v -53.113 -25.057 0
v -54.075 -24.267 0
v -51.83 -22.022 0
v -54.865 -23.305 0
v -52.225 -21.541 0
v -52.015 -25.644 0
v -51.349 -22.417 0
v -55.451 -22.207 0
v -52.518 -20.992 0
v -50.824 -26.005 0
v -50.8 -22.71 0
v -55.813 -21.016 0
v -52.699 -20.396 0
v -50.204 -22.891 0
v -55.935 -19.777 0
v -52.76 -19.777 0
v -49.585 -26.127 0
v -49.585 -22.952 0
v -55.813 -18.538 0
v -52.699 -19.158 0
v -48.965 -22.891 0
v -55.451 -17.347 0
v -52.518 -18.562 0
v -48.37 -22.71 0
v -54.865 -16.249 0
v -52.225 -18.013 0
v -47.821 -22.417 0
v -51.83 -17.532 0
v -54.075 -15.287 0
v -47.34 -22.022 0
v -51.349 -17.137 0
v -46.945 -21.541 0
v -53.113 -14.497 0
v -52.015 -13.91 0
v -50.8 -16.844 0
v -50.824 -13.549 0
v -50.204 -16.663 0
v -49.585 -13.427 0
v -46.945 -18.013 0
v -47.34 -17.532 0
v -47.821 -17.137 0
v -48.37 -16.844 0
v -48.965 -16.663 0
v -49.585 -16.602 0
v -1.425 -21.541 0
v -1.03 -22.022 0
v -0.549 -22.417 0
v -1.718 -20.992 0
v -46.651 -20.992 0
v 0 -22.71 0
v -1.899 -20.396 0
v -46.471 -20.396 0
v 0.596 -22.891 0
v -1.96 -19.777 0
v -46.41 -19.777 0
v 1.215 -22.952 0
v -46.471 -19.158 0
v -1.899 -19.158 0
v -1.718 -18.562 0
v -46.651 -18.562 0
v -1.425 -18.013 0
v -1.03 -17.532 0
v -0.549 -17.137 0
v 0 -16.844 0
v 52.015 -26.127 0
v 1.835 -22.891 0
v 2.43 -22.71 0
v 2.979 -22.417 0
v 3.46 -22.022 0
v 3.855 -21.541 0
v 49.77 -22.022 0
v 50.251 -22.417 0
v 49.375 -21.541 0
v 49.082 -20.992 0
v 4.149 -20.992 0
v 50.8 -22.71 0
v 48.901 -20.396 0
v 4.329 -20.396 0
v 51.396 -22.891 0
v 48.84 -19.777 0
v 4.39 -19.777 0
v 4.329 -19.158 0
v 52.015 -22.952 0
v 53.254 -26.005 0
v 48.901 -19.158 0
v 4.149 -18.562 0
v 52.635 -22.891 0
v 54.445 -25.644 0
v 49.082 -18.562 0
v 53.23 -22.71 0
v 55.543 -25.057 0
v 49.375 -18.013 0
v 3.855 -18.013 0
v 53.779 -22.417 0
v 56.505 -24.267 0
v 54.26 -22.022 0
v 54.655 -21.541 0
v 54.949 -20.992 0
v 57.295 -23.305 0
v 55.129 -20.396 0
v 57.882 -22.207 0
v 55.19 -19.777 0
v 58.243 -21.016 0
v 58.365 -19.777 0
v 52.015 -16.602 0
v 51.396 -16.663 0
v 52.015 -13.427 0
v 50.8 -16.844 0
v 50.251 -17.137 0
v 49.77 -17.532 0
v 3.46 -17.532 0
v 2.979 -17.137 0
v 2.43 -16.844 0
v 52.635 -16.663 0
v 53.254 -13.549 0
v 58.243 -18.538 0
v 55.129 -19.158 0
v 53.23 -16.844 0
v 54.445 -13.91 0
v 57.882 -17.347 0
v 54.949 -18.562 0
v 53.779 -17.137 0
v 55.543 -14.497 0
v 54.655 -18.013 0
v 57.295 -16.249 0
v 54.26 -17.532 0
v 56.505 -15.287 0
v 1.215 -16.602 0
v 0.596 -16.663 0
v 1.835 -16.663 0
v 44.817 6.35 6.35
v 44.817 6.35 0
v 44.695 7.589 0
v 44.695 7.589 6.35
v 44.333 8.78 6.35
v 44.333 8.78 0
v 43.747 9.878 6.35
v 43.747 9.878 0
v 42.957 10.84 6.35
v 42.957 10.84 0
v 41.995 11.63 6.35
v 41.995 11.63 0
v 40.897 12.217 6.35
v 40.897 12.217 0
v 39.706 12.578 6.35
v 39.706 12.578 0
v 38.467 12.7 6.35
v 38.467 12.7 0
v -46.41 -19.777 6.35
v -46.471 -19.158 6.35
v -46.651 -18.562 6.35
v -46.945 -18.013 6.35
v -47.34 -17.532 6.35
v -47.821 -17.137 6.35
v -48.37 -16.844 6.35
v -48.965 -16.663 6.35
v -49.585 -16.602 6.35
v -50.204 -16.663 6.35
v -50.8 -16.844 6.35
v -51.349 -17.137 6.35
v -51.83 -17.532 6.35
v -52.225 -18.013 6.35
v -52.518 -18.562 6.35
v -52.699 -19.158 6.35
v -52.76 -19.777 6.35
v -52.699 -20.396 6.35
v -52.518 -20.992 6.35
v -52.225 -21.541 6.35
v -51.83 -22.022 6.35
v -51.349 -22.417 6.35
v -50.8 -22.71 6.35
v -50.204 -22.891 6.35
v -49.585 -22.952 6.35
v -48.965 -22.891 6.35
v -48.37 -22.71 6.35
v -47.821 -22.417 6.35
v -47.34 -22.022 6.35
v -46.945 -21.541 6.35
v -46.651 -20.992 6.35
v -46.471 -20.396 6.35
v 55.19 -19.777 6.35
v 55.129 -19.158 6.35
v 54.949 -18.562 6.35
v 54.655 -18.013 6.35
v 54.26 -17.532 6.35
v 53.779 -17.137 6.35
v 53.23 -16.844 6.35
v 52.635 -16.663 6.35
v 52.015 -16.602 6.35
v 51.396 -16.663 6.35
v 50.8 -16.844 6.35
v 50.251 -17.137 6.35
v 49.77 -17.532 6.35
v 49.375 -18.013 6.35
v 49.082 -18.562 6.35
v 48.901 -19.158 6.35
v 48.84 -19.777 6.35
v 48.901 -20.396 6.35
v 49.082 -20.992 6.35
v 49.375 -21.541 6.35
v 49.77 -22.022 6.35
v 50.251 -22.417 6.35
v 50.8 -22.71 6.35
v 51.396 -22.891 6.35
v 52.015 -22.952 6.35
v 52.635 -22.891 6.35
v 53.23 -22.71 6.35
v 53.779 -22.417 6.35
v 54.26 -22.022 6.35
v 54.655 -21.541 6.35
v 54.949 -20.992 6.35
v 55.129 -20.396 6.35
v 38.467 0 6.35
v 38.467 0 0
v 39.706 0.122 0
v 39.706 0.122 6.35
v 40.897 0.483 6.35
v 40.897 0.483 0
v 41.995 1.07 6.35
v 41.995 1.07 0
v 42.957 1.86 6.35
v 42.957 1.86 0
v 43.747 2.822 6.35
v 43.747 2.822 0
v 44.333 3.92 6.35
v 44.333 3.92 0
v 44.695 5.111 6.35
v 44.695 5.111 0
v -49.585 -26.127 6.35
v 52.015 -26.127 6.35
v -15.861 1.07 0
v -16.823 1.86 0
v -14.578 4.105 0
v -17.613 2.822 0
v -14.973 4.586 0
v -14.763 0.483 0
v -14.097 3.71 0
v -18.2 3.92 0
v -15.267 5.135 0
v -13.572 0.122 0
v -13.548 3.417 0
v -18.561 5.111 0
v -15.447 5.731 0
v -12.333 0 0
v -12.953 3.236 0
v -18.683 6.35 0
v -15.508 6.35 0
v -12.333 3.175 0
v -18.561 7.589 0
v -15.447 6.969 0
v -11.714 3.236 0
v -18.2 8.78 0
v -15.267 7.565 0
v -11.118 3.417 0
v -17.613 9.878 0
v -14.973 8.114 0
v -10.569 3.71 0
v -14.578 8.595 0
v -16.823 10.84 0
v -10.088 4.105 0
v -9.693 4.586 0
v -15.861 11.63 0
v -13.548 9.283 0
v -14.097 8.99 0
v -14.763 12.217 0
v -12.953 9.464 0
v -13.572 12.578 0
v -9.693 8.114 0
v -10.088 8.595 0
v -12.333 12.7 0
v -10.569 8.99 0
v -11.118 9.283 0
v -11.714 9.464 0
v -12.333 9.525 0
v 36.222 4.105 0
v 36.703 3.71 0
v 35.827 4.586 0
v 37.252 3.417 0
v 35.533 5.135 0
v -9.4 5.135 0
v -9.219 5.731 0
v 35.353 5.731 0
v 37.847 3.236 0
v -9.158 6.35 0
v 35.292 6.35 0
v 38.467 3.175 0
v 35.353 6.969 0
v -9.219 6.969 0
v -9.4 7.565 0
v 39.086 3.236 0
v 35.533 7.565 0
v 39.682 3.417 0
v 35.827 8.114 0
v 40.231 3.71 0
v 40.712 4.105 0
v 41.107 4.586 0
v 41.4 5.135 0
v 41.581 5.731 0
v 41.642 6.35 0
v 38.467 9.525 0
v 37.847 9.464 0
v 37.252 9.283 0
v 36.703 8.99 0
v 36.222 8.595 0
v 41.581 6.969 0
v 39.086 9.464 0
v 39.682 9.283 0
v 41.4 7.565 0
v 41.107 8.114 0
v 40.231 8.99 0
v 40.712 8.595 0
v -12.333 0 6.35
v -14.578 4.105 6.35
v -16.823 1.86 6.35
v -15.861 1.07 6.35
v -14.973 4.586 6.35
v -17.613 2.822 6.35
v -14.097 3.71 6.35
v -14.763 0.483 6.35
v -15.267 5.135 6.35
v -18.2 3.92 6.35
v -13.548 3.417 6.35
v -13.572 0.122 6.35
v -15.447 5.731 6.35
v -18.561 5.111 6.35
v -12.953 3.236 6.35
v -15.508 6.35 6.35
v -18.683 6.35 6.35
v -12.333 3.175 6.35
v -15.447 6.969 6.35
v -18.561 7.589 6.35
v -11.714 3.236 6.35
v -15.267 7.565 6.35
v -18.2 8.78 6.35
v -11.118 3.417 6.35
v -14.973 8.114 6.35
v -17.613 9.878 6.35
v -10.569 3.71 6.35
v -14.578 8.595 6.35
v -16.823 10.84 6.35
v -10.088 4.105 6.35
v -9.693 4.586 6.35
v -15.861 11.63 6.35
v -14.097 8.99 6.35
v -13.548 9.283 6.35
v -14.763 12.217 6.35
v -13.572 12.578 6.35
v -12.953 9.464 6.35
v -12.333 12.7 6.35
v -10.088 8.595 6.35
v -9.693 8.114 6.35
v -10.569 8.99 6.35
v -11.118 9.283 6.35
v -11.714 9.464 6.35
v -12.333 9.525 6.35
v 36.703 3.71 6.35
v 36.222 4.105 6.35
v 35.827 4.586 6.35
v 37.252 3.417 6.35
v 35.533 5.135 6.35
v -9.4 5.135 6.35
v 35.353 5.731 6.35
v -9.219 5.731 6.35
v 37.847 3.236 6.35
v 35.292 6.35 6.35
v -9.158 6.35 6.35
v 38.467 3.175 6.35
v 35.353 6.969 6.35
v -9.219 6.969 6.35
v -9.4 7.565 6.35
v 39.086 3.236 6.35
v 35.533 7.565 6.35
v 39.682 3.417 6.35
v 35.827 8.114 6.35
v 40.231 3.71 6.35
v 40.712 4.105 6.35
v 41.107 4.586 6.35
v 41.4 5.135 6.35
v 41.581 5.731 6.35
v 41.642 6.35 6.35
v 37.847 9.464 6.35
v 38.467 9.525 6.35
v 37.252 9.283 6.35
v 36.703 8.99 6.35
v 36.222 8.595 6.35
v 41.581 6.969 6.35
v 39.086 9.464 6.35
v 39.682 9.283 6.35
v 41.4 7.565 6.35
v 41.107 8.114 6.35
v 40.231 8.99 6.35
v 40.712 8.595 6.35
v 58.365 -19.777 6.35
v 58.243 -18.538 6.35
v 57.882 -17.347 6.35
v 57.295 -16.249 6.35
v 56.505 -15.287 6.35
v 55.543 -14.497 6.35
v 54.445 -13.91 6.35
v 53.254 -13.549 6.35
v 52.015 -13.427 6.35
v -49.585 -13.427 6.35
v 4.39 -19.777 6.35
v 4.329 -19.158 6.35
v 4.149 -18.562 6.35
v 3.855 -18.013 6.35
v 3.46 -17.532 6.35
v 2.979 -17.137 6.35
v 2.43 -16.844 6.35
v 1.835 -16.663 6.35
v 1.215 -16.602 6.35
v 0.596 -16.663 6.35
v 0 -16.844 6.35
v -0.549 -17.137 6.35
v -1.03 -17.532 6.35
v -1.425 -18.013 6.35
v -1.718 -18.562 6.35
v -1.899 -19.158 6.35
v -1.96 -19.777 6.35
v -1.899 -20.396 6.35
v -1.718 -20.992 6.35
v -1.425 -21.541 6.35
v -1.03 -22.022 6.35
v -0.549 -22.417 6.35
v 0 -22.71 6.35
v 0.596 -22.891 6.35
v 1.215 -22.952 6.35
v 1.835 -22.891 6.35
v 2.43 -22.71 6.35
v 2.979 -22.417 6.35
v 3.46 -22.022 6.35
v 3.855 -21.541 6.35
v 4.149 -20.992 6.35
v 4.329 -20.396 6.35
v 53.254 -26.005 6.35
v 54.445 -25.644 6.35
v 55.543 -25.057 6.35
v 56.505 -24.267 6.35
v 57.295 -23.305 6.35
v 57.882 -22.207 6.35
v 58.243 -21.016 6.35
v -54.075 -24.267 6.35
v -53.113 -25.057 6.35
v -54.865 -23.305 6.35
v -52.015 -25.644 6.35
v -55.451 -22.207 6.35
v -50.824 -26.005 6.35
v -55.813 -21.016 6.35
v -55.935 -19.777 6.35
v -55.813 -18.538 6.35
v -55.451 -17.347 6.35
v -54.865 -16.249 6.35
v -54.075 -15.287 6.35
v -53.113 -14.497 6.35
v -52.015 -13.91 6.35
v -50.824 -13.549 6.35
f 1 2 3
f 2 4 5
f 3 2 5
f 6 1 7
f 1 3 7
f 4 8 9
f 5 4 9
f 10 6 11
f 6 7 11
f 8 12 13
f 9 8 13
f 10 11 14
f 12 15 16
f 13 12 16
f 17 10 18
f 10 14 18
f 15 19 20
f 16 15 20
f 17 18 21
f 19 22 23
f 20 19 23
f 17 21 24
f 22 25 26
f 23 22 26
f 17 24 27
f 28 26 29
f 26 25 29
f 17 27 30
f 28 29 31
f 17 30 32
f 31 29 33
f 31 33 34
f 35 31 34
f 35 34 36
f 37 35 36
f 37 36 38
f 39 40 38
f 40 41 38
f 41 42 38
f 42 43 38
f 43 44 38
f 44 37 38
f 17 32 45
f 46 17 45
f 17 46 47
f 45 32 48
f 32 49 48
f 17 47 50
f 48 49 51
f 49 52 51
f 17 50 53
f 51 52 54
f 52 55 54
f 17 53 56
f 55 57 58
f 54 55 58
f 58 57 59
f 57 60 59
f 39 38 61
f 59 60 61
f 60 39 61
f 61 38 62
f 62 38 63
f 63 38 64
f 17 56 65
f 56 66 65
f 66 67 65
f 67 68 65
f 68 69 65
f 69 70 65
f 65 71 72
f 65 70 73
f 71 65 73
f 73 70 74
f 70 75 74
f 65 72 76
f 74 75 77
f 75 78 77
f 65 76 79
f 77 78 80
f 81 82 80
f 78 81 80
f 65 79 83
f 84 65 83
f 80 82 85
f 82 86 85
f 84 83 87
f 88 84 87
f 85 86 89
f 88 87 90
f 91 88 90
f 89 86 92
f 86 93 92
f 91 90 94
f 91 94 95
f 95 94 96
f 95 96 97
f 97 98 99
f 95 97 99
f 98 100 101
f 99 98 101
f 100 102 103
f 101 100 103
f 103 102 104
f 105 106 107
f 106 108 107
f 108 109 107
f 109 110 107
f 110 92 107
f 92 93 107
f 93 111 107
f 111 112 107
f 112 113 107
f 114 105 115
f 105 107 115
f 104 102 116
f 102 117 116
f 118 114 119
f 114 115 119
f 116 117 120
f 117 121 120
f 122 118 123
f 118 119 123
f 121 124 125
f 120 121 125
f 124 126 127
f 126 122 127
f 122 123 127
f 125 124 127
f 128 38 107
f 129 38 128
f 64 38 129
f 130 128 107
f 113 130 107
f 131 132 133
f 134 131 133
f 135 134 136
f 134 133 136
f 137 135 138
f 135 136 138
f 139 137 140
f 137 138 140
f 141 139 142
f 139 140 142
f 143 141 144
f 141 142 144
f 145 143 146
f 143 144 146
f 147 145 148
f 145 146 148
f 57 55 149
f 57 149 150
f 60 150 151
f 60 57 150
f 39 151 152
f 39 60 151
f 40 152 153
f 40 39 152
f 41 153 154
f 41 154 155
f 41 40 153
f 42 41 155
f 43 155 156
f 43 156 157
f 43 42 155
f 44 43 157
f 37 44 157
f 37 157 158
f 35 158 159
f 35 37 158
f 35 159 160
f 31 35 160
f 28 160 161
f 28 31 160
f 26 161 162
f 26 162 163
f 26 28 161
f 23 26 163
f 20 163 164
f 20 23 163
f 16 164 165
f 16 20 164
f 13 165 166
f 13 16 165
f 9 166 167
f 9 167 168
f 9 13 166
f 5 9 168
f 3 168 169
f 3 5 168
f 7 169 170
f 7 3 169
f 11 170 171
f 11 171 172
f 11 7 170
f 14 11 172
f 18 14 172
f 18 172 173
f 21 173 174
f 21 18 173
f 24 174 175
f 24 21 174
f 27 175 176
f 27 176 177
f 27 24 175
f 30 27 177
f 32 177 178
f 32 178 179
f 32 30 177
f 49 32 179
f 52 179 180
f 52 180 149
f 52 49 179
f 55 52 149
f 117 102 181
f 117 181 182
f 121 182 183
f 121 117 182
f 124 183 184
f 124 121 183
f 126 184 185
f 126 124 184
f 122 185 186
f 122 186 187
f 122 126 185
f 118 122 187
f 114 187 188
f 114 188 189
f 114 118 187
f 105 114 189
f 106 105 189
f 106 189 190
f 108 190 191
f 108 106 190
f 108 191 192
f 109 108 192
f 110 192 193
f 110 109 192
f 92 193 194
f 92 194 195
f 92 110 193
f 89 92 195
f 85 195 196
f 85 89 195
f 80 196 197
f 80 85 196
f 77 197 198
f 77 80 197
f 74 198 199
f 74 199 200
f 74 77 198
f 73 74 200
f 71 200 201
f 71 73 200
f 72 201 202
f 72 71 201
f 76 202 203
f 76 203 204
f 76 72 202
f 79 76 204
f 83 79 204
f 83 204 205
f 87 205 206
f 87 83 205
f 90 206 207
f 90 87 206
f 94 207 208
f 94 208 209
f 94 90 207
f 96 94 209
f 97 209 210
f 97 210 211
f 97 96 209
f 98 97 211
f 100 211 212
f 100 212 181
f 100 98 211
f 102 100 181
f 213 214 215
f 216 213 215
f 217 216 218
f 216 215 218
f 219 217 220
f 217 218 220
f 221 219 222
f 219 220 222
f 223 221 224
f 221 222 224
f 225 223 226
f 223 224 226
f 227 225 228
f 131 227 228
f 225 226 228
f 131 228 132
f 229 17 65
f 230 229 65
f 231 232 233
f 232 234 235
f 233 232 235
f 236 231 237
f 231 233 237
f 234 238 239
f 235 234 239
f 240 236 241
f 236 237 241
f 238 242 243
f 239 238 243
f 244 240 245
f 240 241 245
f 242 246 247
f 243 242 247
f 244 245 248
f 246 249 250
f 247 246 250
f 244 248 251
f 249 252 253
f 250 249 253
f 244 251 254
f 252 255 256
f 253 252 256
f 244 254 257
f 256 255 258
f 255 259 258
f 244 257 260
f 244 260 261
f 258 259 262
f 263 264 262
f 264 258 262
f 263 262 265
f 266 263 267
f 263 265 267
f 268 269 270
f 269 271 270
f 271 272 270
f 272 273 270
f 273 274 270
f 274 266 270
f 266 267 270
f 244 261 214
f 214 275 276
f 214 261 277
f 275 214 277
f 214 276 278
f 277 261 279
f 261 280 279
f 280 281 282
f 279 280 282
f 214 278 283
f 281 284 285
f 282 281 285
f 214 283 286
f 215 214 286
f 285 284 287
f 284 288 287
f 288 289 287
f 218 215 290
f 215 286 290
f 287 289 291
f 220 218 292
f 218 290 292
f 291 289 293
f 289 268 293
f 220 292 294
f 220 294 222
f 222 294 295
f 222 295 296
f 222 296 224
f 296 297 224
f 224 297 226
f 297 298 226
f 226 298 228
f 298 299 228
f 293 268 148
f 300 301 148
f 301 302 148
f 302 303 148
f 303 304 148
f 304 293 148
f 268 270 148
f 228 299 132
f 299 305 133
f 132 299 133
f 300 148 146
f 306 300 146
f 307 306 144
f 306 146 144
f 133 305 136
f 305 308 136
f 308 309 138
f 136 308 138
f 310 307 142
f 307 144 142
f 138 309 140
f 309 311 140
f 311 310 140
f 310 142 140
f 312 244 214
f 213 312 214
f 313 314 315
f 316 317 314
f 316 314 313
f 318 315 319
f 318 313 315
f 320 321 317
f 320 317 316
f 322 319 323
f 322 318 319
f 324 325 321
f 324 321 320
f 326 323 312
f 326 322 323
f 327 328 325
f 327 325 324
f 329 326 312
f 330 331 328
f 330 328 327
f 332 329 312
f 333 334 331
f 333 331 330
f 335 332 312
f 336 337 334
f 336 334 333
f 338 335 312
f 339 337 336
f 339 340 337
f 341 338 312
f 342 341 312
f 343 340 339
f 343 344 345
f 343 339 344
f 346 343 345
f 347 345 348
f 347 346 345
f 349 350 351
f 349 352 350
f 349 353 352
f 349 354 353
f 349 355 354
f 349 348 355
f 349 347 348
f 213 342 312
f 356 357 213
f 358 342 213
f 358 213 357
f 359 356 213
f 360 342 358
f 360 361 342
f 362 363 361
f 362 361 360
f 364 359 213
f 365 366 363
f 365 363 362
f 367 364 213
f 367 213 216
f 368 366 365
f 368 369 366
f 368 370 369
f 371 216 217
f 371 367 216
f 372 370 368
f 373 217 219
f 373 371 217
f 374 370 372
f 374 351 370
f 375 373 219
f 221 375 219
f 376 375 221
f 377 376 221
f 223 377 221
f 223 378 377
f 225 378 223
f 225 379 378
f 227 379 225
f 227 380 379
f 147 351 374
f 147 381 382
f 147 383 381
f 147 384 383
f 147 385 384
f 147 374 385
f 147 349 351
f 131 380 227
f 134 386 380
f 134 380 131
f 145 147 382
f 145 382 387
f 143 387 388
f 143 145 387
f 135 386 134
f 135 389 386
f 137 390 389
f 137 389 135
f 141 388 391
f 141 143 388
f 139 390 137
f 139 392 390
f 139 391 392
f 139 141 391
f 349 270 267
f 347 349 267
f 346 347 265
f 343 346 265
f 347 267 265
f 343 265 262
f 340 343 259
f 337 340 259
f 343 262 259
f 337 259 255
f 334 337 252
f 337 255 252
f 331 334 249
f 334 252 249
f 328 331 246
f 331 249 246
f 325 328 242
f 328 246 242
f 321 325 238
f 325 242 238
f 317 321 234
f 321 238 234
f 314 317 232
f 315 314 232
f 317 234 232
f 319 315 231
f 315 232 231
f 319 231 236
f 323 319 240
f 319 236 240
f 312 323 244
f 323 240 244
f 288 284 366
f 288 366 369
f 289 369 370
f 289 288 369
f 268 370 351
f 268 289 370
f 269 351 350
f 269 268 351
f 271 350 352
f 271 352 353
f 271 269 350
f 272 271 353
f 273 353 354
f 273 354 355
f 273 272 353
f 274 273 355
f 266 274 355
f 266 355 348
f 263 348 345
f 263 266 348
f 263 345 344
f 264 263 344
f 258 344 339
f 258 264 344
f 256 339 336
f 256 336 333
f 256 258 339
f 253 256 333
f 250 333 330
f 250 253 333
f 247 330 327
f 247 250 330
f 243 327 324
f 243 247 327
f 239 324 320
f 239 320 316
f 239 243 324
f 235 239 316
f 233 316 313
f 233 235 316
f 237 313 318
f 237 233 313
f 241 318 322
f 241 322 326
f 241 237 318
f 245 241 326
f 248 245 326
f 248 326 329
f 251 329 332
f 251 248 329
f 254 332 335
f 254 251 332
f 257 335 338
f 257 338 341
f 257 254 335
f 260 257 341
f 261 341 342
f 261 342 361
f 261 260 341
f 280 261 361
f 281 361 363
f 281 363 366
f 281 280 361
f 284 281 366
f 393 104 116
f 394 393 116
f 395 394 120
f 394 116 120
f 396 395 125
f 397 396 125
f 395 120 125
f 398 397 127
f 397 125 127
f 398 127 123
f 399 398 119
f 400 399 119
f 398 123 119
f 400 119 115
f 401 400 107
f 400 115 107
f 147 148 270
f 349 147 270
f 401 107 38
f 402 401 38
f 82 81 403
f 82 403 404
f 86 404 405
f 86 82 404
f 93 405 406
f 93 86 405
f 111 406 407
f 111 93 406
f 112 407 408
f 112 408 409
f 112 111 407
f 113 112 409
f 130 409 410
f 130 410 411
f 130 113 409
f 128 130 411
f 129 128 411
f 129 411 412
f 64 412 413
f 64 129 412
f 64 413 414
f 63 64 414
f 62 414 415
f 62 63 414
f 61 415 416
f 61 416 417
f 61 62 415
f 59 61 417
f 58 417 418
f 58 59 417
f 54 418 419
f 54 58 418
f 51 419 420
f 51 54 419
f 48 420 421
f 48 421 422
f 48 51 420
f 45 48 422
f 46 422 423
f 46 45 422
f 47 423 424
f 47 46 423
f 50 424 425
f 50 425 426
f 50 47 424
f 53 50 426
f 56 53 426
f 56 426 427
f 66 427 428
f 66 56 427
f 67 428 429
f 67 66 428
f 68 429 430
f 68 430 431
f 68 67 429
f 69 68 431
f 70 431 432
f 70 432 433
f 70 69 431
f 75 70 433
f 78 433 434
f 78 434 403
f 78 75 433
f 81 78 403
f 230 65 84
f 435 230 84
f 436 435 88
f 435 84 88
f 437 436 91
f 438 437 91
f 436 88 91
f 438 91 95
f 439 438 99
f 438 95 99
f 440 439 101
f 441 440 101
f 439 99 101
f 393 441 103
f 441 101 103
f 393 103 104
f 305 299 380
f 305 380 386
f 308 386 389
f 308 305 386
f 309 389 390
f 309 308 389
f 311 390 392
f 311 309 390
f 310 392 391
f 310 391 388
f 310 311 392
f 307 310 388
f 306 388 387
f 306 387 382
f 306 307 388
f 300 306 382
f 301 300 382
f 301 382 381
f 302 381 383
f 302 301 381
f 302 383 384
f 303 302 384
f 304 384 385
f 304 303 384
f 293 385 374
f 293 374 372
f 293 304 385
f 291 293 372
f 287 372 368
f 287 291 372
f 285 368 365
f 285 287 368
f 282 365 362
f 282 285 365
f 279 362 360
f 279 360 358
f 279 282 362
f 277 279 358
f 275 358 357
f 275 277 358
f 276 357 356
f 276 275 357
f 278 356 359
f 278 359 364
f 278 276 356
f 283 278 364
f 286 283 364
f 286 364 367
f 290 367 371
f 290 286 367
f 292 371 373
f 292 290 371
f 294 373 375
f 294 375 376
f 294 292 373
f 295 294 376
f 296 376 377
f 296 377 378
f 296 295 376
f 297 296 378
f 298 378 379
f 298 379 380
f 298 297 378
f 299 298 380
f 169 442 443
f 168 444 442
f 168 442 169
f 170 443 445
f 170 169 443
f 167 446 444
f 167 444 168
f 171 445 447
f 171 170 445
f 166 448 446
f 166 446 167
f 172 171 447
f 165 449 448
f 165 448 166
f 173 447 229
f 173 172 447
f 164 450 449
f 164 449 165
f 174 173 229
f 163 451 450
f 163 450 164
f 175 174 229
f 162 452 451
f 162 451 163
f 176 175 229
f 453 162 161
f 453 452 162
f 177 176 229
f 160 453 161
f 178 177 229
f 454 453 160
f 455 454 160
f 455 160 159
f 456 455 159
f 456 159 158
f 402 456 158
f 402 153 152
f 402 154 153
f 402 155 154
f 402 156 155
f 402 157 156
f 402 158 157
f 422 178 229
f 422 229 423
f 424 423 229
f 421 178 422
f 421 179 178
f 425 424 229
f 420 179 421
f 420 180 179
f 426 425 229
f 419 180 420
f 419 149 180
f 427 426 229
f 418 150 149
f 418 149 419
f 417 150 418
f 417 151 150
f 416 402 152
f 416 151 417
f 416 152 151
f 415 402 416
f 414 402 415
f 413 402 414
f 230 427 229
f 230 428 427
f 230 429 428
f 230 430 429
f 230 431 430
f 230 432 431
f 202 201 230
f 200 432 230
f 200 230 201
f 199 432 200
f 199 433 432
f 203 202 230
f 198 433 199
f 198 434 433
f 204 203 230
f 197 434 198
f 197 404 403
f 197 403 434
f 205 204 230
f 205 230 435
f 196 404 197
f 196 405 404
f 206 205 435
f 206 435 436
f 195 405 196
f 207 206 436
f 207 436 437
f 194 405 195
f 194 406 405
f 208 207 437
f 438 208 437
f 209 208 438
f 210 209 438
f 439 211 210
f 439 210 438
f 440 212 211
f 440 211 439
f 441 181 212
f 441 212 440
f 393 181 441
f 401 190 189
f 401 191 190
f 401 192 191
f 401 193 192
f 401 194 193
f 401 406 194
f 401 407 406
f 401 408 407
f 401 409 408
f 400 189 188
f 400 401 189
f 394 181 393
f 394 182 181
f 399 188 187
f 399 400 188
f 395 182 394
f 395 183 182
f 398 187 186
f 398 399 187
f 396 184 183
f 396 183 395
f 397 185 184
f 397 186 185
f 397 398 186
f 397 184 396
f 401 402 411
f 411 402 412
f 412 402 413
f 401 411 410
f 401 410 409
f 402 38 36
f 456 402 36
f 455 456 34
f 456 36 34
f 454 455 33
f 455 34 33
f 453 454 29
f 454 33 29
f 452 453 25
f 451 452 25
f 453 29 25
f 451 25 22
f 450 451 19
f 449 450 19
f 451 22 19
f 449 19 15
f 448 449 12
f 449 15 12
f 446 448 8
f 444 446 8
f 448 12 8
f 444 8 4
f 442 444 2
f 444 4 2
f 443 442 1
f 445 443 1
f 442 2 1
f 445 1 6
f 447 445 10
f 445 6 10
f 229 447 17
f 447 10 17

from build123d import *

# Parameters (mm, degrees)
F0_R     = 3.175
F1_DEPTH = 6.35


with BuildPart() as f1:
    # F0 (on Top) → F1 (new body)
    with BuildSketch(Plane.XY):
        with BuildLine():
            ThreePointArc((-12.333258, 0), (-7.84313, 1.859872), (-5.983258, 6.35))
            ThreePointArc((-5.983258, 6.35), (-7.84313, 10.840128), (-12.333258, 12.7))
            ThreePointArc((-12.333258, 12.7), (-18.683258, 6.35), (-12.333258, 0))
        make_face()
        with Locations((-12.333258, 6.35)):
            Circle(F0_R, mode=Mode.SUBTRACT)
        with BuildLine():
            ThreePointArc((-12.333258, 12.7), (-7.84313, 10.840128), (-5.983258, 6.35))
            ThreePointArc((-5.983258, 6.35), (-7.84313, 1.859872), (-12.333258, 0))
            Line((-12.333258, 0), (38.466742, 0))
            ThreePointArc((38.466742, 0), (32.116742, 6.35), (38.466742, 12.7))
            Line((38.466742, 12.7), (-12.333258, 12.7))
        make_face()
        with BuildLine():
            ThreePointArc((44.816742, 6.35), (42.95687, 10.840128), (38.466742, 12.7))
            ThreePointArc((38.466742, 12.7), (32.116742, 6.35), (38.466742, 0))
            ThreePointArc((38.466742, 0), (42.95687, 1.859872), (44.816742, 6.35))
        make_face()
        with Locations((38.466742, 6.35)):
            Circle(F0_R, mode=Mode.SUBTRACT)
        with BuildLine():
            ThreePointArc((-49.584795, -13.427065), (-45.094667, -15.286937), (-43.234795, -19.777065))
            ThreePointArc((-43.234795, -19.777065), (-45.094667, -24.267193), (-49.584795, -26.127065))
            Line((-49.584795, -26.127065), (1.215205, -26.127065))
            ThreePointArc((1.215205, -26.127065), (-5.134795, -19.777065), (1.215205, -13.427065))
            Line((1.215205, -13.427065), (-49.584795, -13.427065))
        make_face()
        with BuildLine():
            Line((52.015205, -13.427065), (1.215205, -13.427065))
            ThreePointArc((1.215205, -13.427065), (5.705333, -15.286937), (7.565205, -19.777065))
            ThreePointArc((7.565205, -19.777065), (5.705333, -24.267193), (1.215205, -26.127065))
            Line((1.215205, -26.127065), (52.015205, -26.127065))
            ThreePointArc((52.015205, -26.127065), (45.665205, -19.777065), (52.015205, -13.427065))
        make_face()
        with BuildLine():
            ThreePointArc((58.365205, -19.777065), (56.505333, -15.286937), (52.015205, -13.427065))
            ThreePointArc((52.015205, -13.427065), (45.665205, -19.777065), (52.015205, -26.127065))
            ThreePointArc((52.015205, -26.127065), (56.505333, -24.267193), (58.365205, -19.777065))
        make_face()
        with Locations((52.015205, -19.777065)):
            Circle(F0_R, mode=Mode.SUBTRACT)
        with BuildLine():
            ThreePointArc((7.565205, -19.777065), (5.705333, -15.286937), (1.215205, -13.427065))
            ThreePointArc((1.215205, -13.427065), (-5.134795, -19.777065), (1.215205, -26.127065))
            ThreePointArc((1.215205, -26.127065), (5.705333, -24.267193), (7.565205, -19.777065))
        make_face()
        with Locations((1.215205, -19.777065)):
            Circle(F0_R, mode=Mode.SUBTRACT)
        with BuildLine():
            ThreePointArc((-49.584795, -26.127065), (-45.094667, -24.267193), (-43.234795, -19.777065))
            ThreePointArc((-43.234795, -19.777065), (-45.094667, -15.286937), (-49.584795, -13.427065))
            ThreePointArc((-49.584795, -13.427065), (-55.934795, -19.777065), (-49.584795, -26.127065))
        make_face()
        with Locations((-49.584795, -19.777065)):
            Circle(F0_R, mode=Mode.SUBTRACT)
    extrude(amount=F1_DEPTH)


solid = f1.part
